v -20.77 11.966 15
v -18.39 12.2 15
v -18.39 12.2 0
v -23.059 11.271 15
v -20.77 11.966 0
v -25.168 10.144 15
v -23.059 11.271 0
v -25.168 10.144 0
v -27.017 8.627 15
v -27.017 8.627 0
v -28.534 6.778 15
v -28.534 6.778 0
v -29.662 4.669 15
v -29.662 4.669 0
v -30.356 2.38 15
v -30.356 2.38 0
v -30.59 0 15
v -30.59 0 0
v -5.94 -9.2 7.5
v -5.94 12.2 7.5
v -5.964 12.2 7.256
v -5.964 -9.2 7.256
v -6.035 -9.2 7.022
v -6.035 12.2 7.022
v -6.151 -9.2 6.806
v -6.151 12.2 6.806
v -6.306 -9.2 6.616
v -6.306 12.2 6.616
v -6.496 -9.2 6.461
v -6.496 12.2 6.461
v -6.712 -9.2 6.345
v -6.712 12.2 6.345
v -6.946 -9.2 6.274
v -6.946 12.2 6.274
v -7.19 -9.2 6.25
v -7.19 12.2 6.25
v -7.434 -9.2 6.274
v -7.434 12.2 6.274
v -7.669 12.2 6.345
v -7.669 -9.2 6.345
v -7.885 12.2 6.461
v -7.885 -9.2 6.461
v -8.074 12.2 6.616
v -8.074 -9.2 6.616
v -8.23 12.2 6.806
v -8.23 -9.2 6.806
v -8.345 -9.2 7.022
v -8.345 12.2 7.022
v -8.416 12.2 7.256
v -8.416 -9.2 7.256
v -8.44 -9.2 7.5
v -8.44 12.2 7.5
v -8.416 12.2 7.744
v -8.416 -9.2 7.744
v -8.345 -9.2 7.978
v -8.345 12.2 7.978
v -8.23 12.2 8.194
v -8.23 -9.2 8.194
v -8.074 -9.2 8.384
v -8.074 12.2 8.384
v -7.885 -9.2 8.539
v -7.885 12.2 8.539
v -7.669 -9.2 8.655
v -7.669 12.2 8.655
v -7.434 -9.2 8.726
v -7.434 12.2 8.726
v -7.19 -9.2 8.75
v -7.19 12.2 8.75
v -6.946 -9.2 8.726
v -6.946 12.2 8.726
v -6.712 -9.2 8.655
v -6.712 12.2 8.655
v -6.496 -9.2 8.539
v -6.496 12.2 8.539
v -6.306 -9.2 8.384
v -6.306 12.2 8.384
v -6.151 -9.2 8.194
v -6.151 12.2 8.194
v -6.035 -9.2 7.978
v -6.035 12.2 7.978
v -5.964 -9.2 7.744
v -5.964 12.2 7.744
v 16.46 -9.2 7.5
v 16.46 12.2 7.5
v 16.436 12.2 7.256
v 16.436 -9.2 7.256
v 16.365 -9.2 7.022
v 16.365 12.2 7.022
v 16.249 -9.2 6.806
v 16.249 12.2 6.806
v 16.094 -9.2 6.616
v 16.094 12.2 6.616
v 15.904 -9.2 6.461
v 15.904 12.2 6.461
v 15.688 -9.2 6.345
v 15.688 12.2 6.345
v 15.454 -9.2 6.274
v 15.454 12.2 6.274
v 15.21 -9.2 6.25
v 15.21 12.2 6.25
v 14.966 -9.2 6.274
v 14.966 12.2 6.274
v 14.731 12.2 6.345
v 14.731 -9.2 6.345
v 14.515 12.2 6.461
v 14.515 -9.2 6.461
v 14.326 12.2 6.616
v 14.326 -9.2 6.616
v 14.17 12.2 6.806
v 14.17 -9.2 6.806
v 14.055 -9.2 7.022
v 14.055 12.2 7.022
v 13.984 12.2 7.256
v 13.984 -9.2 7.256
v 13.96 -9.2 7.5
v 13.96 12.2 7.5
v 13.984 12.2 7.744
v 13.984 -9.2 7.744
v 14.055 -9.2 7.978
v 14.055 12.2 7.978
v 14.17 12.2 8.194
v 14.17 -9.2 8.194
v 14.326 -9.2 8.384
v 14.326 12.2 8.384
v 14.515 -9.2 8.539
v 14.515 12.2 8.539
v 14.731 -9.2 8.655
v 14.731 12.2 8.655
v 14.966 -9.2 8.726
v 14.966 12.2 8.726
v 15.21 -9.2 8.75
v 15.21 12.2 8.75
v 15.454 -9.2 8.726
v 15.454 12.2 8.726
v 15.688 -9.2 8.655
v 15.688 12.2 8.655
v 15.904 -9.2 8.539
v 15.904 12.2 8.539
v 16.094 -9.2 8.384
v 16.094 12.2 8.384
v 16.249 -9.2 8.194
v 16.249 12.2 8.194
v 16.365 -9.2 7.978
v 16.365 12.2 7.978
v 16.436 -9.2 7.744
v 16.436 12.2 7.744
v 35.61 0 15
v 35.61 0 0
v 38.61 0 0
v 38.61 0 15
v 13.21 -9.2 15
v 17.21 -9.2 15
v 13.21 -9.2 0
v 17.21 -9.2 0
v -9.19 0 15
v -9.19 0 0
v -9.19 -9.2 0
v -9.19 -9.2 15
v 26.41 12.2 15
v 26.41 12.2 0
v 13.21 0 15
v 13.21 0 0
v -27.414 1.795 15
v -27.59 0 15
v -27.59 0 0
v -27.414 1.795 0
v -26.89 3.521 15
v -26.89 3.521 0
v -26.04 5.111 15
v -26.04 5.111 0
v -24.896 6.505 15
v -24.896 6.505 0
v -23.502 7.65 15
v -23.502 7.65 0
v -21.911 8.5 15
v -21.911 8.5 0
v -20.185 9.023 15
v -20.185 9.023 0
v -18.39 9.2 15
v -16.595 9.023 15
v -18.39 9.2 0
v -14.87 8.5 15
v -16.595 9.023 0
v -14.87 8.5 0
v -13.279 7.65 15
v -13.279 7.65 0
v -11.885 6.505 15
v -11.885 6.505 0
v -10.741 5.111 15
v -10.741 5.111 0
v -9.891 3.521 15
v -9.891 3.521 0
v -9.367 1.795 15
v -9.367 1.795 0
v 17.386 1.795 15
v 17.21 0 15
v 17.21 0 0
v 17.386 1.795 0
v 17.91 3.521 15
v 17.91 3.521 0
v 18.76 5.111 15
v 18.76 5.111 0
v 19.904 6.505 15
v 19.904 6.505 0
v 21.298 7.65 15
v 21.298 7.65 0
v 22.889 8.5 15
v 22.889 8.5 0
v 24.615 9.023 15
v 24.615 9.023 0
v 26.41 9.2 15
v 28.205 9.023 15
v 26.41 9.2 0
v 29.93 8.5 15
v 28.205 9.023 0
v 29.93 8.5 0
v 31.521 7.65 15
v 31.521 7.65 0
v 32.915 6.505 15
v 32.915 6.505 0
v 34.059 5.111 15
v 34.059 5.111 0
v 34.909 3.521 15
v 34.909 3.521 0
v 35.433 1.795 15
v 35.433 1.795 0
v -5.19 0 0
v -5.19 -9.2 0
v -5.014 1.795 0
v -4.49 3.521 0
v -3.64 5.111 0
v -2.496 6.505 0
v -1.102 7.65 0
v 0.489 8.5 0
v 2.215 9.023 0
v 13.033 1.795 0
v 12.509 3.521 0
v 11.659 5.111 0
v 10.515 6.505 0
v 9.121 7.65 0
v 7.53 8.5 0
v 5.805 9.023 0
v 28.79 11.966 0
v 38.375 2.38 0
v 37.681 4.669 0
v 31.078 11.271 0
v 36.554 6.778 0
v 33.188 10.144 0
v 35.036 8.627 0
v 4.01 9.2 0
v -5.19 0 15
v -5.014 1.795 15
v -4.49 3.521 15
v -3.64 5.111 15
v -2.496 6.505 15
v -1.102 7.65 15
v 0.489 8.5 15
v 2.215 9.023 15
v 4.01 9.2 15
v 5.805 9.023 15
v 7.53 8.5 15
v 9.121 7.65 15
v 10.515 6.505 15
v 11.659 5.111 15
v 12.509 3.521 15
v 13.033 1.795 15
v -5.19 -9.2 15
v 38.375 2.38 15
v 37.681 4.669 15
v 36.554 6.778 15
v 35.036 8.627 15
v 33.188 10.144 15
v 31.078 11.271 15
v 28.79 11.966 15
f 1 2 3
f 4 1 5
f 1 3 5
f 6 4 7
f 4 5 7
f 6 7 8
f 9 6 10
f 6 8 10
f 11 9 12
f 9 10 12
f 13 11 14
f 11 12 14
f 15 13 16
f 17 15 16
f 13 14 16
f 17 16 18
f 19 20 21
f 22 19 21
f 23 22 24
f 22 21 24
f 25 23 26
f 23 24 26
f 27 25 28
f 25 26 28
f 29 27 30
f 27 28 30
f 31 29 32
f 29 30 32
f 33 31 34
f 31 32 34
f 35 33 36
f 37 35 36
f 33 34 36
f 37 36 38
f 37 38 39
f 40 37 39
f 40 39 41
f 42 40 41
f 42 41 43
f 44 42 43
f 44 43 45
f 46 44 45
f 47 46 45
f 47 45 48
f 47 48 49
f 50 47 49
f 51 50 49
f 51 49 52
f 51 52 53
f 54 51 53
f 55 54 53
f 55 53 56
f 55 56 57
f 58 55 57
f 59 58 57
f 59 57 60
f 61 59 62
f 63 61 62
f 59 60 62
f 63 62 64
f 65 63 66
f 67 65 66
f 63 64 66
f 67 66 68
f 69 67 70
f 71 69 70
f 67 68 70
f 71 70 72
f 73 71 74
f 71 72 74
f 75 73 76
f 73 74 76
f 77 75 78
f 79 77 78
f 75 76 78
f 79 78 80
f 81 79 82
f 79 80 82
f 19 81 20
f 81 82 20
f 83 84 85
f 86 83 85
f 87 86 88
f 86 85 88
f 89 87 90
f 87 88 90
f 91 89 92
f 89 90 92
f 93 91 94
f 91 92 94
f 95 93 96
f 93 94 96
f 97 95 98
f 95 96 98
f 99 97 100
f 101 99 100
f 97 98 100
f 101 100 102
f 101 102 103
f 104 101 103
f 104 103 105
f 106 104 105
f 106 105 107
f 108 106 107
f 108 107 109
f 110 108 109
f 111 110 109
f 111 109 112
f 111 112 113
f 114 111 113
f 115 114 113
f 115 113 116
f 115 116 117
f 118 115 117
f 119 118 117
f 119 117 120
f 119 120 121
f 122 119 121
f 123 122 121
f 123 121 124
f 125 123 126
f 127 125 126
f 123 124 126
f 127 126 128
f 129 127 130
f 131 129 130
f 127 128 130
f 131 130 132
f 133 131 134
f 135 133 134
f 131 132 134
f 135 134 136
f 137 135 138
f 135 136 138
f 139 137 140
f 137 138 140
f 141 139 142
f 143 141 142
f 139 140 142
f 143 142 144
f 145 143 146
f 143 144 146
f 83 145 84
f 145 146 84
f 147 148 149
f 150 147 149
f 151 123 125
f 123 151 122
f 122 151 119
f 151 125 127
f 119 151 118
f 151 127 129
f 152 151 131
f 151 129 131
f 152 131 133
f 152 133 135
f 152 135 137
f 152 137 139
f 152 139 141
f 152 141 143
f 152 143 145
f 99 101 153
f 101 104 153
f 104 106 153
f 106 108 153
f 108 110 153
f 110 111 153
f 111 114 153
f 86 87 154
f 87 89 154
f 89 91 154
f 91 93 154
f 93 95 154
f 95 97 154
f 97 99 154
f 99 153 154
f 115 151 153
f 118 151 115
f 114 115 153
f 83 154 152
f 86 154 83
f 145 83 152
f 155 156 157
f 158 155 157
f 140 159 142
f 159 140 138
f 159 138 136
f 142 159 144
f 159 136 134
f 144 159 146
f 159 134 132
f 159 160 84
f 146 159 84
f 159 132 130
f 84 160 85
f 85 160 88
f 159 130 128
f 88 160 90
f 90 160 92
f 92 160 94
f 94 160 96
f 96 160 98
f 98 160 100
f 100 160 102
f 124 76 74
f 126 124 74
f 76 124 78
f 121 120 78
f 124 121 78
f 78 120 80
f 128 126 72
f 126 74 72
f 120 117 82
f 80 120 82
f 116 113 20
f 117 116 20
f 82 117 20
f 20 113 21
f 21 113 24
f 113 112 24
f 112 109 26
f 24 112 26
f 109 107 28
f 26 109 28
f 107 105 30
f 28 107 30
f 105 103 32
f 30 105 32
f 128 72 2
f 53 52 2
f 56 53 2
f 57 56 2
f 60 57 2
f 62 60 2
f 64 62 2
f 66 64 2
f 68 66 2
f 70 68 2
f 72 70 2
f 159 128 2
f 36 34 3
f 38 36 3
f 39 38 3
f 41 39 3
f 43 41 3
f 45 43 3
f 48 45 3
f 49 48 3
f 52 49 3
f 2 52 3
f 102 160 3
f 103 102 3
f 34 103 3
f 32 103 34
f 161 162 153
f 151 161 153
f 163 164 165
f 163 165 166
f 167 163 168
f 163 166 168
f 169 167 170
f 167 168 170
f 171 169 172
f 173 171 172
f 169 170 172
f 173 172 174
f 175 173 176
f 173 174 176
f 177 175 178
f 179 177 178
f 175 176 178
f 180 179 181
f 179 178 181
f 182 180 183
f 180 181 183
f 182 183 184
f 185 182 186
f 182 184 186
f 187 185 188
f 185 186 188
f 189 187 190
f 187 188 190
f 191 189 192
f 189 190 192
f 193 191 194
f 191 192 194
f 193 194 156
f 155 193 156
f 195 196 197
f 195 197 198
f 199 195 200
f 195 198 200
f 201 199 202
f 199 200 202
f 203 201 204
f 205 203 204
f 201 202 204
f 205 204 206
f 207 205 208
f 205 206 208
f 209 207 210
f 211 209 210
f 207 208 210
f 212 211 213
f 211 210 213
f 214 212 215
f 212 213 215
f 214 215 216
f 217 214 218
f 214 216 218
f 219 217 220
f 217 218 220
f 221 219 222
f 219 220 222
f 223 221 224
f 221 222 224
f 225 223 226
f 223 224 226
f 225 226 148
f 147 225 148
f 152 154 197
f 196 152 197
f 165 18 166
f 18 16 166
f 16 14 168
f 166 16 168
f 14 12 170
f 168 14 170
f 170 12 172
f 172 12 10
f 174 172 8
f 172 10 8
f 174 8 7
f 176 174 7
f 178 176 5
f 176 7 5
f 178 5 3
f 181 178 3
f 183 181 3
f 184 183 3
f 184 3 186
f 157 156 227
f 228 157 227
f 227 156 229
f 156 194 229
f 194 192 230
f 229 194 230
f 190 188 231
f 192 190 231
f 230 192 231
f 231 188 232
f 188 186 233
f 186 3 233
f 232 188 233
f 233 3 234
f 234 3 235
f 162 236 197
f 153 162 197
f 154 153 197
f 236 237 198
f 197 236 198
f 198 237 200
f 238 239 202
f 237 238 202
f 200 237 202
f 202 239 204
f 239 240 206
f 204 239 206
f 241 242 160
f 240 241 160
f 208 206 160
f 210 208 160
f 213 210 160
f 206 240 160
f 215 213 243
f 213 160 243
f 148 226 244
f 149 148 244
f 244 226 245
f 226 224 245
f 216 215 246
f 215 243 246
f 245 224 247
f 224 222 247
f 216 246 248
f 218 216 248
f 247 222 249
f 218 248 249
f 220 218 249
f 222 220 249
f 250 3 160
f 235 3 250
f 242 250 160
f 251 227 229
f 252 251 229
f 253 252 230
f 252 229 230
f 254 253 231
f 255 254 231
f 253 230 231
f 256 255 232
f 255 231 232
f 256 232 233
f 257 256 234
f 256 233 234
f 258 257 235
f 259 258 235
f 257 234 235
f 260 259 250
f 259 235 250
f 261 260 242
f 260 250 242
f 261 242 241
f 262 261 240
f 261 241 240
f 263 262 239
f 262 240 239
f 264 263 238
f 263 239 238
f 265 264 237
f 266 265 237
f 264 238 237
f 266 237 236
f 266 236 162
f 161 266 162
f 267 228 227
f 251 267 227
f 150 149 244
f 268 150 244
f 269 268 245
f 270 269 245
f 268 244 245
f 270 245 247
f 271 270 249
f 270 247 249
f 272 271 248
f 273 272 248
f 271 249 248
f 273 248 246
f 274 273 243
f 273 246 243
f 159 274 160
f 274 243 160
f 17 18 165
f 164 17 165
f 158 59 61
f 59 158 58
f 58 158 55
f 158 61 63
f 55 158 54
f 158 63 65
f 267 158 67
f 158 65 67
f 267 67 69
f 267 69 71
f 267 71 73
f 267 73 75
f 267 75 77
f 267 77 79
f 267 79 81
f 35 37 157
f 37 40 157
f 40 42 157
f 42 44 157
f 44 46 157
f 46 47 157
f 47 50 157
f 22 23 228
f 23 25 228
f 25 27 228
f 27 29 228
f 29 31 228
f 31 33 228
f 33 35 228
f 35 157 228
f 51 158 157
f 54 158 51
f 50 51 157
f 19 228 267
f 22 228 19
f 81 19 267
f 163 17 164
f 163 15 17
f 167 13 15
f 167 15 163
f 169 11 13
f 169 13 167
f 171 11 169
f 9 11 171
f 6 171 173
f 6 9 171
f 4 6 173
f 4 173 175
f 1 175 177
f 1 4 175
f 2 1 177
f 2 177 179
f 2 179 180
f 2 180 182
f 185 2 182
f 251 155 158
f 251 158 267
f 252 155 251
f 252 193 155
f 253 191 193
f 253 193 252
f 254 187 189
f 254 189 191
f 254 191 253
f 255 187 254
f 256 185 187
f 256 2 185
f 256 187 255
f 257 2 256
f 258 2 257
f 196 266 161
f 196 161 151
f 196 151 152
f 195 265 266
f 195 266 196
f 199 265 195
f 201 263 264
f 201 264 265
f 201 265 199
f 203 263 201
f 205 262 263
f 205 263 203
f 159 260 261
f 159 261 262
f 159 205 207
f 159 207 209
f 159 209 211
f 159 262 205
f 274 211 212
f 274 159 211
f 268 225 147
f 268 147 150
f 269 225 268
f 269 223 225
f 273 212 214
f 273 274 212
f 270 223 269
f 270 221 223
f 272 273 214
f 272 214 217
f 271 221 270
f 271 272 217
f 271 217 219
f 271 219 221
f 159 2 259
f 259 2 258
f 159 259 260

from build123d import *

# Parameters (mm, degrees)
BOSS_EXTRUDE1_DEPTH         = 15
TAP_DRILL_FOR_M3X0_5_TAP1_D = 2.5


with BuildPart() as part:
    # Sketch1 → Boss-Extrude1 (new body)
    with BuildSketch(Plane.XY):
        with BuildLine():
            Line((-30.590304709, 0), (-27.590304709, 0))
            ThreePointArc((-27.590304709, 0), (-18.390304709, 9.2), (-9.190304709, 0))
            Line((-9.190304709, 0), (-9.190304709, -9.2))
            Line((-9.190304709, -9.2), (-5.190304709, -9.2))
            Line((-5.190304709, -9.2), (-5.190304709, 0))
            ThreePointArc((-5.190304709, 0), (4.009695291, 9.2), (13.209695291, 0))
            Line((13.209695291, 0), (13.209695291, -9.2))
            Line((13.209695291, -9.2), (17.209695291, -9.2))
            Line((17.209695291, -9.2), (17.209695291, 0))
            ThreePointArc((17.209695291, 0), (26.409695291, 9.2), (35.609695291, 0))
            Line((35.609695291, 0), (38.609695291, 0))
            ThreePointArc((38.609695291, 0), (35.036398021, 8.62670273), (26.409695291, 12.2))
            Line((26.409695291, 12.2), (-18.390304709, 12.2))
            ThreePointArc((-18.390304709, 12.2), (-27.01700744, 8.62670273), (-30.590304709, 0))
        make_face()
    extrude(amount=BOSS_EXTRUDE1_DEPTH)

    # Tap Drill for M3x0.5 Tap1 (through all)
    with Locations(Plane(origin=(0, -9.2, 0), x_dir=(-1, 0, 0), z_dir=(0, -1, 0))):
        with Locations((7.190304709, -7.5), (-15.209695291, -7.5)):
            Hole(TAP_DRILL_FOR_M3X0_5_TAP1_D / 2)


solid = part.part
